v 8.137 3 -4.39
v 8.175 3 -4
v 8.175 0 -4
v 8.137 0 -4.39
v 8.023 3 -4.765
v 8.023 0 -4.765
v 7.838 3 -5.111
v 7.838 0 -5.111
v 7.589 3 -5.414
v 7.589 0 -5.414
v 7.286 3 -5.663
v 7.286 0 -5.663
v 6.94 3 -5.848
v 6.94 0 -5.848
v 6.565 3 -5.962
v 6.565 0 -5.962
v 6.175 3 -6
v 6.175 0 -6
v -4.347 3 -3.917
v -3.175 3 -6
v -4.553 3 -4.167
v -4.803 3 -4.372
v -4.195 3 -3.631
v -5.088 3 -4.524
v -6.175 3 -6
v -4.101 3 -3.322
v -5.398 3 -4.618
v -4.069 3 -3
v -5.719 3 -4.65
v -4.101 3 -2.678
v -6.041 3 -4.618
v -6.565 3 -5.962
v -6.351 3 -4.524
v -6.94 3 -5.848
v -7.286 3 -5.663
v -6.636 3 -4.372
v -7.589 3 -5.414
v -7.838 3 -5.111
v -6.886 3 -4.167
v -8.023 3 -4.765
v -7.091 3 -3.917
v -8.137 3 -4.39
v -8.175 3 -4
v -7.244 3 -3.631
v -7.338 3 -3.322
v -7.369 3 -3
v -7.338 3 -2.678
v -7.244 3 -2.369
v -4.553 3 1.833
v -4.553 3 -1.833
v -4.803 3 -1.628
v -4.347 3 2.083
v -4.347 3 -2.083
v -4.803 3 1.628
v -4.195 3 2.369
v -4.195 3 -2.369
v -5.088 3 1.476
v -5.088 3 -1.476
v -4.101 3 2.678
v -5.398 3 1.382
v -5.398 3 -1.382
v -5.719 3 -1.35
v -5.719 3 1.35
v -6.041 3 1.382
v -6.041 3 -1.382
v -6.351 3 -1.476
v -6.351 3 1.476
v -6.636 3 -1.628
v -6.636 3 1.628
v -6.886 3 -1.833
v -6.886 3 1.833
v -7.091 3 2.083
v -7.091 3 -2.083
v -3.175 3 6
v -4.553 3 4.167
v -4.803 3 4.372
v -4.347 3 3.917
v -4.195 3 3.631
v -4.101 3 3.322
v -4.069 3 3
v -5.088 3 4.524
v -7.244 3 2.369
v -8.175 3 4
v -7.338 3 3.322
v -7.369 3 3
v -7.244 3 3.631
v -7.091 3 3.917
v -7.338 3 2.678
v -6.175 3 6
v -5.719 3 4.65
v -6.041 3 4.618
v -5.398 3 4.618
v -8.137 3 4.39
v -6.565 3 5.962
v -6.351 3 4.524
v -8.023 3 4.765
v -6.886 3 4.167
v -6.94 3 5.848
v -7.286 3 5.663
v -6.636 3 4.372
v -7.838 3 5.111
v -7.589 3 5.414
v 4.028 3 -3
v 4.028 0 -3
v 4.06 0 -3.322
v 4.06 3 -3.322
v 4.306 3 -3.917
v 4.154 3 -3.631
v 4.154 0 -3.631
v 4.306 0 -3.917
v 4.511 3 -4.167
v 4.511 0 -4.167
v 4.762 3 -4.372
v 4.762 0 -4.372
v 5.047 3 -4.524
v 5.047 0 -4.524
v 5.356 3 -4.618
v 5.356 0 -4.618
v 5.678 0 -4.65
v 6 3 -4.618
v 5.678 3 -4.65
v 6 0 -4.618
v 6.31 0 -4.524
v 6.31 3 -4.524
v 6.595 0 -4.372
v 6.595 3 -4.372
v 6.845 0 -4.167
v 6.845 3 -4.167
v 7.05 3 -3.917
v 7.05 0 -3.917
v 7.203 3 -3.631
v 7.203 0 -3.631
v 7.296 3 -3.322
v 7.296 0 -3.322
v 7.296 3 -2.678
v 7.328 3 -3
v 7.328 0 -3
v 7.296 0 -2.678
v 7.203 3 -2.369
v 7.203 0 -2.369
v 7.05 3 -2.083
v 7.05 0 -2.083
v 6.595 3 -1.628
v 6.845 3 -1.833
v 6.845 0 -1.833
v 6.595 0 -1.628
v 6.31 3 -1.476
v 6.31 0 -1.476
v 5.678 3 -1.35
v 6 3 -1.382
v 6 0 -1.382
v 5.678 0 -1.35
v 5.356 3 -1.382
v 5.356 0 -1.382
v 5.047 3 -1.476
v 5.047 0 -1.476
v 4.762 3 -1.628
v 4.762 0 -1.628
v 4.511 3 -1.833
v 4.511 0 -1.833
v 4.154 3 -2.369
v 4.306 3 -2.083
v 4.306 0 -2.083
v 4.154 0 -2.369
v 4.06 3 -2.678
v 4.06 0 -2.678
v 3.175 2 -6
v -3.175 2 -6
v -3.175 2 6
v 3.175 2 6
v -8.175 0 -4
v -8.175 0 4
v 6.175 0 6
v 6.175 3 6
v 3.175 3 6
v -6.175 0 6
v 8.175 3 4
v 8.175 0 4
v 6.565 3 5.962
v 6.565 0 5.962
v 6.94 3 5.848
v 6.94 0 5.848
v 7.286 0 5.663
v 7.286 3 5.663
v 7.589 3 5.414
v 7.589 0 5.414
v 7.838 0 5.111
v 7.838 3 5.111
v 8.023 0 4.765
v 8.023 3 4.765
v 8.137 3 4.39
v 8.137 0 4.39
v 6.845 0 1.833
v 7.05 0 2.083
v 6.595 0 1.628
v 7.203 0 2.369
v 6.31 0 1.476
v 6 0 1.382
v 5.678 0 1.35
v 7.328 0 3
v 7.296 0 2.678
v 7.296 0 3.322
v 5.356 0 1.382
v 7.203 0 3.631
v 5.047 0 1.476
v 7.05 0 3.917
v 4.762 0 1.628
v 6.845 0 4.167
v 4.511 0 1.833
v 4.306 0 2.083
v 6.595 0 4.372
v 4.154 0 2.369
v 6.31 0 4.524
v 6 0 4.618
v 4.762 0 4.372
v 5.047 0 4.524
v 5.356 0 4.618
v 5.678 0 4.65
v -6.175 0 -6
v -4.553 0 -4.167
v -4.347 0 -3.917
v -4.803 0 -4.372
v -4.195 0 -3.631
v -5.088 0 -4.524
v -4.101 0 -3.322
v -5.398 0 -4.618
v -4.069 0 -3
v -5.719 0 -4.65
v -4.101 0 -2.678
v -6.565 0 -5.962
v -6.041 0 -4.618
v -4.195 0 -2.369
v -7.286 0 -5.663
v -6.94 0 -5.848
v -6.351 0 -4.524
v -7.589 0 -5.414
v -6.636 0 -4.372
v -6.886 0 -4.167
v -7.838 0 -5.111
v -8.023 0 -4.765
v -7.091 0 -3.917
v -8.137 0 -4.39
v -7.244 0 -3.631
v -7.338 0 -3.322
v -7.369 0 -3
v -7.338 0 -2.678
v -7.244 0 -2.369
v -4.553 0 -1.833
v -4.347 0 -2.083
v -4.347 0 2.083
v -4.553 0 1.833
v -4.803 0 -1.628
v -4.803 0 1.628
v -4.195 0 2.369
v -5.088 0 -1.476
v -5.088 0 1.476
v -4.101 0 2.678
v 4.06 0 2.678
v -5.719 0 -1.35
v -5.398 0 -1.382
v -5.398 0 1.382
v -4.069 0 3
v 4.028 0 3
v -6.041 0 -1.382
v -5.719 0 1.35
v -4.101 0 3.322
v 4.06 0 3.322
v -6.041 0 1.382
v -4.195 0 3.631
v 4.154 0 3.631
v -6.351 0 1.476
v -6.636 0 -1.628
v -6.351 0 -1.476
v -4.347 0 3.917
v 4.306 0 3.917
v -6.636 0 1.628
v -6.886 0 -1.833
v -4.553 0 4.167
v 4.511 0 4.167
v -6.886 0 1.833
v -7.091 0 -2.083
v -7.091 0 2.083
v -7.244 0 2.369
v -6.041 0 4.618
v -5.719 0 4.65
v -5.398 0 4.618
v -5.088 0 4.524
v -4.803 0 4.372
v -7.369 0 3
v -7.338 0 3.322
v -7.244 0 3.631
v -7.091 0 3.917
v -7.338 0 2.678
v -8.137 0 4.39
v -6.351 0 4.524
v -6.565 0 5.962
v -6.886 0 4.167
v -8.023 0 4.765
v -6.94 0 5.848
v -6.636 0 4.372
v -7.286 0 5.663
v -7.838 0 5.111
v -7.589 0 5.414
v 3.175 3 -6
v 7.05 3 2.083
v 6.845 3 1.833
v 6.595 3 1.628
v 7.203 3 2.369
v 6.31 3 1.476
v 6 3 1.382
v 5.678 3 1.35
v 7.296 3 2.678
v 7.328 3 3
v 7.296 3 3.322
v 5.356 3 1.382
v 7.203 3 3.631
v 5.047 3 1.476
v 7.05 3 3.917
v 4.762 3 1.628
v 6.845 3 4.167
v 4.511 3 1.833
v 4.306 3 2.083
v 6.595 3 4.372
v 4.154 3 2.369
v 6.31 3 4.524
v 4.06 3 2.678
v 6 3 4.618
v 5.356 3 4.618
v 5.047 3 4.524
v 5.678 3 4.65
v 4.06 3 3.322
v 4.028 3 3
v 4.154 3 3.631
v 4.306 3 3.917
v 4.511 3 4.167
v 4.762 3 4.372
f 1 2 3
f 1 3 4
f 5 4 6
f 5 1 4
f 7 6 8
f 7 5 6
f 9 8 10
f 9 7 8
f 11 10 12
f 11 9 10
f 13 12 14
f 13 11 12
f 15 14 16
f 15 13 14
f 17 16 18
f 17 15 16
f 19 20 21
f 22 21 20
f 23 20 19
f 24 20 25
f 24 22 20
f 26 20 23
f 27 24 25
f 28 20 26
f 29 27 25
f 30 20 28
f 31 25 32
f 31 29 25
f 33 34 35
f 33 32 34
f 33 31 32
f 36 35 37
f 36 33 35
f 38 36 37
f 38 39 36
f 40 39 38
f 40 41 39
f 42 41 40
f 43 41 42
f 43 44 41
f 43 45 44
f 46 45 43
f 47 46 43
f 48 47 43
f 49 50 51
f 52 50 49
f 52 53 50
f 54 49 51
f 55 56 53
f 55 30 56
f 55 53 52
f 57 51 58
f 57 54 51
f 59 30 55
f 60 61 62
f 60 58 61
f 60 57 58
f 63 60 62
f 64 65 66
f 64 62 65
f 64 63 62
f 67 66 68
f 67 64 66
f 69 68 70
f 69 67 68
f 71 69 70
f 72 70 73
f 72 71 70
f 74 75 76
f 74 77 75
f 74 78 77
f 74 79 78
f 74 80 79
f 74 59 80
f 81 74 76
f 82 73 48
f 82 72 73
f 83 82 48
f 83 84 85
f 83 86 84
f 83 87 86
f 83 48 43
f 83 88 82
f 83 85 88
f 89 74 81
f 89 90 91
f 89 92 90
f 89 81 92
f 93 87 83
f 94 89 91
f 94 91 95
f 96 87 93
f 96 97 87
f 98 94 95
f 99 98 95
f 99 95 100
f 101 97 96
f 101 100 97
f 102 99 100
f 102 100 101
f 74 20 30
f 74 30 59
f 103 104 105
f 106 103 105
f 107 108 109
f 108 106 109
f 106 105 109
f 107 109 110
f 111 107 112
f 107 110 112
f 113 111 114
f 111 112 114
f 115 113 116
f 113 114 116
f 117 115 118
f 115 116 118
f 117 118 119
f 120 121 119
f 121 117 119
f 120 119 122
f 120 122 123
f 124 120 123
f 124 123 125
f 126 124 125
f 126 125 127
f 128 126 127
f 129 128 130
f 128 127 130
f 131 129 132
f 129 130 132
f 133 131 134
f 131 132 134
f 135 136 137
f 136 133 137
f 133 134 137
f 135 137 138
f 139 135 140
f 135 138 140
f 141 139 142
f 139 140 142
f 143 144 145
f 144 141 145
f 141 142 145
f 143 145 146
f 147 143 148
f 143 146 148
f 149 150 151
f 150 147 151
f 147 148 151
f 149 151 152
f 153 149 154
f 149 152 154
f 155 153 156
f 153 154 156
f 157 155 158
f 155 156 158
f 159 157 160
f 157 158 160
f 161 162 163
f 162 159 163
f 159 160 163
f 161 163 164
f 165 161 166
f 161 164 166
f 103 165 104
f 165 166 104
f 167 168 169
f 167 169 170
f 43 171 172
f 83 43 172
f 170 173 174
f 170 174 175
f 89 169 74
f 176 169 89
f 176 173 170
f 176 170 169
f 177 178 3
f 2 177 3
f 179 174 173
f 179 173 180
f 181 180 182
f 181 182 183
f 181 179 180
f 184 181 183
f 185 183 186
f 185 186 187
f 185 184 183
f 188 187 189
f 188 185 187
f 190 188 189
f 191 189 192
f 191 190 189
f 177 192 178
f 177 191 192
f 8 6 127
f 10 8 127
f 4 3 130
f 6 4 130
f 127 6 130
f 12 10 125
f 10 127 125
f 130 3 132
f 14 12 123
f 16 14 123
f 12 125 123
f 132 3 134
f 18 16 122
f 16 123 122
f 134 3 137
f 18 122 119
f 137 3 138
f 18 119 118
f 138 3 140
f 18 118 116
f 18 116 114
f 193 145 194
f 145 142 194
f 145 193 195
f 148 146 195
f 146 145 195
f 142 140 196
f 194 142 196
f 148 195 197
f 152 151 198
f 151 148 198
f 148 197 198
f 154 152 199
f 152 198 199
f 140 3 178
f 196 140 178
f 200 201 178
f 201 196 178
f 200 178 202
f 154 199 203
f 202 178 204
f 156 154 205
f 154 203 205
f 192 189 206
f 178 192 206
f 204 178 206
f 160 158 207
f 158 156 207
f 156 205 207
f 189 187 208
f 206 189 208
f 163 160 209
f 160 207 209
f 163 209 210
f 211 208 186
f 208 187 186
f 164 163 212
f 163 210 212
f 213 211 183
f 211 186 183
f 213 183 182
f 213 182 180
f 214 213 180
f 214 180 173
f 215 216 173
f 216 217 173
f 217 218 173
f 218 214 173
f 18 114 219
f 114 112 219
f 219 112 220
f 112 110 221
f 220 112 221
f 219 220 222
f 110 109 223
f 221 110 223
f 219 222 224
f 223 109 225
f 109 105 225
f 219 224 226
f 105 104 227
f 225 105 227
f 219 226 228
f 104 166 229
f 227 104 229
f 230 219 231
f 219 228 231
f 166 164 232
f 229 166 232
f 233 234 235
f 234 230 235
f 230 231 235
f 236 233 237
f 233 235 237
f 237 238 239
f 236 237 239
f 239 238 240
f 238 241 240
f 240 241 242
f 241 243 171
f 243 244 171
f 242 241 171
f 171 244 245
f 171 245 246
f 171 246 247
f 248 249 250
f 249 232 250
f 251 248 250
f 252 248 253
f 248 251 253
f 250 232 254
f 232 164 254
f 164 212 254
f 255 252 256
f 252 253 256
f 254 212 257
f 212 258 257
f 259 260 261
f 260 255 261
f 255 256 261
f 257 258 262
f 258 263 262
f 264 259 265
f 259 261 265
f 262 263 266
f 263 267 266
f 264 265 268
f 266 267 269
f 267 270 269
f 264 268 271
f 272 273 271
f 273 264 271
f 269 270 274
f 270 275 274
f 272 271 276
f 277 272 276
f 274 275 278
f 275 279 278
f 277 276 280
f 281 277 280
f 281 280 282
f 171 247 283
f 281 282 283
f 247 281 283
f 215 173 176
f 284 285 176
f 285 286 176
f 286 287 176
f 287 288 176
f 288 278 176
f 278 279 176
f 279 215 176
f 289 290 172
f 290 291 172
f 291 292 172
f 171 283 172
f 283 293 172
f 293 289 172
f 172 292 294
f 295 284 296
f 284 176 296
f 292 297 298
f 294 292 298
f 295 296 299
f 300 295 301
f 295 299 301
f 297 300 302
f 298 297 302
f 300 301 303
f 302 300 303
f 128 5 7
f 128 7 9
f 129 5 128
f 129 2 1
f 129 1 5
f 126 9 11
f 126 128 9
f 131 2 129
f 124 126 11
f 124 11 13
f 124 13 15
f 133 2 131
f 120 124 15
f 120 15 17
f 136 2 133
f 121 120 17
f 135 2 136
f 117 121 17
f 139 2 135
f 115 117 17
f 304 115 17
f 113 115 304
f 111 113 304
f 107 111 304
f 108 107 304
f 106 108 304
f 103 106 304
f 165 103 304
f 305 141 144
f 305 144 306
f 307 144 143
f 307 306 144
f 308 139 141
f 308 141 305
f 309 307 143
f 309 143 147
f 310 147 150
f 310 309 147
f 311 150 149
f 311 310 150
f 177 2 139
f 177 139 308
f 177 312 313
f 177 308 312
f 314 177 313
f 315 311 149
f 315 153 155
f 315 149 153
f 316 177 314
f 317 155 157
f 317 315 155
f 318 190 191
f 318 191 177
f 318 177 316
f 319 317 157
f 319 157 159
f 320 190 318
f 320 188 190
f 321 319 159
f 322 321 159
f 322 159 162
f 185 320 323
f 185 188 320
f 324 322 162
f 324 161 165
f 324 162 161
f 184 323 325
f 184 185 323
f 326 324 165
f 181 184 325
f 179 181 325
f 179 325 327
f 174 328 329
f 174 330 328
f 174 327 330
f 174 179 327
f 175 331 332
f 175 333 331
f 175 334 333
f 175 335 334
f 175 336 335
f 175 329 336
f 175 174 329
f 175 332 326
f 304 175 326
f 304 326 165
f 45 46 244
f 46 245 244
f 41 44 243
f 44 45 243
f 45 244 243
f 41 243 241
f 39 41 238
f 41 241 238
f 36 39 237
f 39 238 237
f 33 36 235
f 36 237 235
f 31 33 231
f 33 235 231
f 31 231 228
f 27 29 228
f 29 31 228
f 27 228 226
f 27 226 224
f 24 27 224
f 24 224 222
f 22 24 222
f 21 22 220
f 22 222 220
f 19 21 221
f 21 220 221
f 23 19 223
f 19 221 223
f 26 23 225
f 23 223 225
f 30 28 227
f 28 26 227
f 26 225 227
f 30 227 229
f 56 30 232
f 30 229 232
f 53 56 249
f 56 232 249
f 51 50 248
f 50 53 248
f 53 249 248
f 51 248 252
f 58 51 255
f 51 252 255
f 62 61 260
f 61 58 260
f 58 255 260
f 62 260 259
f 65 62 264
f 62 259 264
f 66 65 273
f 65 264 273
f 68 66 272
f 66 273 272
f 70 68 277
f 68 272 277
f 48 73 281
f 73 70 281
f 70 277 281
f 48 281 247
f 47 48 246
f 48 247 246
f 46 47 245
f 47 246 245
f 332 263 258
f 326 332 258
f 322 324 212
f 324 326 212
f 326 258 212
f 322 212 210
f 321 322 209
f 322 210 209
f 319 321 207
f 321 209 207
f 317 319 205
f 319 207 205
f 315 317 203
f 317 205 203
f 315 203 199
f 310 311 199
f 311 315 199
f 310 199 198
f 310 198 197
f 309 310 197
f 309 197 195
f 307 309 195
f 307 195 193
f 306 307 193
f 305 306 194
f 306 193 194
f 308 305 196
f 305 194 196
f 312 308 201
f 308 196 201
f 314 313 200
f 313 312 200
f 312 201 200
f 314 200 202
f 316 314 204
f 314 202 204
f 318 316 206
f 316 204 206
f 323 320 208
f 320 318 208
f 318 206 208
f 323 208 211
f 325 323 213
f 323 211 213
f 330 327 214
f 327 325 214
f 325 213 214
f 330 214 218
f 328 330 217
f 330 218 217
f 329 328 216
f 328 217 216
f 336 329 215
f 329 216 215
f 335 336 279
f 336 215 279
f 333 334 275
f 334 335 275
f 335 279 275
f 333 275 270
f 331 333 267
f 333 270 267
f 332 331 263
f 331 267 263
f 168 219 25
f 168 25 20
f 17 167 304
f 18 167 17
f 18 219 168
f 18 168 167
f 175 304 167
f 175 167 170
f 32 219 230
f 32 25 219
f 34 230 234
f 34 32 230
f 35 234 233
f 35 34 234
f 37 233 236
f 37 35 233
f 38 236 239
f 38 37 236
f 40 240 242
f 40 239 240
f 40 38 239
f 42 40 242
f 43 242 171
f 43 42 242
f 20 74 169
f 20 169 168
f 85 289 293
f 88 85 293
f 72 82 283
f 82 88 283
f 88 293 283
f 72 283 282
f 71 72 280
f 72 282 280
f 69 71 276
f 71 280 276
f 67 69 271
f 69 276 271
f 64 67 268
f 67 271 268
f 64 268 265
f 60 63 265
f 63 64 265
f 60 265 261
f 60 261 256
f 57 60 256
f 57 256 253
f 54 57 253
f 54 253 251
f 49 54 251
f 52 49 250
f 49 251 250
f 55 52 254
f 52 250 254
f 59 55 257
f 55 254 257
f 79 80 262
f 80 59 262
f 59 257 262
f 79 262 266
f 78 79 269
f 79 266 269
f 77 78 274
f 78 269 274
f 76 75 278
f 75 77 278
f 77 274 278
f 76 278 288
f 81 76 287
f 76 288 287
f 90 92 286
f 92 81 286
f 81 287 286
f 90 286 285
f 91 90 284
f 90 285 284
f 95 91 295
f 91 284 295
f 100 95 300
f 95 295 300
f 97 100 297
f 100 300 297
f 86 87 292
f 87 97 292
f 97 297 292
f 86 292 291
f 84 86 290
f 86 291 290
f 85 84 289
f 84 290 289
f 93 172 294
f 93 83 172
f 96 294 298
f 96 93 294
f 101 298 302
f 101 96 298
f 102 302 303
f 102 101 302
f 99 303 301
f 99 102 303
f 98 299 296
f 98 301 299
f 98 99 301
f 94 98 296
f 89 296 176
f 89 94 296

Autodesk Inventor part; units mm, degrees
ref_plane "YZ Plane" through (0, 0, 0) normal (1, 0, 0) x (0, 1, 0)
ref_plane "XZ Plane" through (0, 0, 0) normal (0, 1, 0) x (-1, 0, 0)
ref_plane "XY Plane" through (0, 0, 0) normal (0, 0, 1) x (1, 0, 0)
sketch "Boceto1" plane through (0, 0, 0) normal (0, 1, 0) x (-1, 0, 0)
  line L0 (-3.175, 6) -> (3.175, 6)
  line L1 (3.175, 6) -> (3.175, -6)
  line L2 (3.175, -6) -> (-3.175, -6)
  line L3 (-3.175, -6) -> (-3.175, 6)
  line L4 (-3.175, 6) -> (3.175, -6) construction
  line L5 (3.175, 6) -> (-3.175, -6) construction
  line L6 (8.175, 6) -> (-8.175, 6)
  line L7 (-8.175, 6) -> (-8.175, -6)
  line L8 (-8.175, -6) -> (8.175, -6)
  line L9 (8.175, -6) -> (8.175, 6)
  circle A0 centre (5.7194, 3) radius 1.65
  circle A1 centre (5.7194, -3) radius 1.65
  circle A2 centre (-5.6782, 3) radius 1.65
  circle A3 centre (-5.6782, -3) radius 1.65
  point P0 (0, 0)
  dimension "d0" = 6.35
  dimension "d1" = 12
  dimension "d2" = 5
  dimension "d3" = 5
  dimension "d4" = 3.3
  dimension "d5" = 3
  dimension "d6" = 3
extrude "Extrusión1" add sketch "Boceto1" along normal blind 3
sketch "Boceto2" plane through (0, 3, 0) normal (0, 1, 0) x (1, 0, 0)
  line L0 (8.175, 6) -> (-8.175, 6) projected
  line L1 (3.175, -6) -> (-3.175, -6)
  line L2 (-3.175, -6) -> (-3.175, 6)
  line L3 (-3.175, 6) -> (3.175, 6)
  line L4 (3.175, 6) -> (3.175, -6)
  line L5 (3.175, -6) -> (-3.175, 6) construction
  line L6 (-3.175, -6) -> (3.175, 6) construction
  point P0 (0, 0)
  dimension "d9" = 6.35
extrude "Extrusión2" cut sketch "Boceto2" against normal blind 1
fillet "Empalme1" radius 2 4 edges at (-8.175, 1.5, 6) (8.175, 1.5, 6) (8.175, 1.5, -6) (-8.175, 1.5, -6)
properties part number "lockbelt"
